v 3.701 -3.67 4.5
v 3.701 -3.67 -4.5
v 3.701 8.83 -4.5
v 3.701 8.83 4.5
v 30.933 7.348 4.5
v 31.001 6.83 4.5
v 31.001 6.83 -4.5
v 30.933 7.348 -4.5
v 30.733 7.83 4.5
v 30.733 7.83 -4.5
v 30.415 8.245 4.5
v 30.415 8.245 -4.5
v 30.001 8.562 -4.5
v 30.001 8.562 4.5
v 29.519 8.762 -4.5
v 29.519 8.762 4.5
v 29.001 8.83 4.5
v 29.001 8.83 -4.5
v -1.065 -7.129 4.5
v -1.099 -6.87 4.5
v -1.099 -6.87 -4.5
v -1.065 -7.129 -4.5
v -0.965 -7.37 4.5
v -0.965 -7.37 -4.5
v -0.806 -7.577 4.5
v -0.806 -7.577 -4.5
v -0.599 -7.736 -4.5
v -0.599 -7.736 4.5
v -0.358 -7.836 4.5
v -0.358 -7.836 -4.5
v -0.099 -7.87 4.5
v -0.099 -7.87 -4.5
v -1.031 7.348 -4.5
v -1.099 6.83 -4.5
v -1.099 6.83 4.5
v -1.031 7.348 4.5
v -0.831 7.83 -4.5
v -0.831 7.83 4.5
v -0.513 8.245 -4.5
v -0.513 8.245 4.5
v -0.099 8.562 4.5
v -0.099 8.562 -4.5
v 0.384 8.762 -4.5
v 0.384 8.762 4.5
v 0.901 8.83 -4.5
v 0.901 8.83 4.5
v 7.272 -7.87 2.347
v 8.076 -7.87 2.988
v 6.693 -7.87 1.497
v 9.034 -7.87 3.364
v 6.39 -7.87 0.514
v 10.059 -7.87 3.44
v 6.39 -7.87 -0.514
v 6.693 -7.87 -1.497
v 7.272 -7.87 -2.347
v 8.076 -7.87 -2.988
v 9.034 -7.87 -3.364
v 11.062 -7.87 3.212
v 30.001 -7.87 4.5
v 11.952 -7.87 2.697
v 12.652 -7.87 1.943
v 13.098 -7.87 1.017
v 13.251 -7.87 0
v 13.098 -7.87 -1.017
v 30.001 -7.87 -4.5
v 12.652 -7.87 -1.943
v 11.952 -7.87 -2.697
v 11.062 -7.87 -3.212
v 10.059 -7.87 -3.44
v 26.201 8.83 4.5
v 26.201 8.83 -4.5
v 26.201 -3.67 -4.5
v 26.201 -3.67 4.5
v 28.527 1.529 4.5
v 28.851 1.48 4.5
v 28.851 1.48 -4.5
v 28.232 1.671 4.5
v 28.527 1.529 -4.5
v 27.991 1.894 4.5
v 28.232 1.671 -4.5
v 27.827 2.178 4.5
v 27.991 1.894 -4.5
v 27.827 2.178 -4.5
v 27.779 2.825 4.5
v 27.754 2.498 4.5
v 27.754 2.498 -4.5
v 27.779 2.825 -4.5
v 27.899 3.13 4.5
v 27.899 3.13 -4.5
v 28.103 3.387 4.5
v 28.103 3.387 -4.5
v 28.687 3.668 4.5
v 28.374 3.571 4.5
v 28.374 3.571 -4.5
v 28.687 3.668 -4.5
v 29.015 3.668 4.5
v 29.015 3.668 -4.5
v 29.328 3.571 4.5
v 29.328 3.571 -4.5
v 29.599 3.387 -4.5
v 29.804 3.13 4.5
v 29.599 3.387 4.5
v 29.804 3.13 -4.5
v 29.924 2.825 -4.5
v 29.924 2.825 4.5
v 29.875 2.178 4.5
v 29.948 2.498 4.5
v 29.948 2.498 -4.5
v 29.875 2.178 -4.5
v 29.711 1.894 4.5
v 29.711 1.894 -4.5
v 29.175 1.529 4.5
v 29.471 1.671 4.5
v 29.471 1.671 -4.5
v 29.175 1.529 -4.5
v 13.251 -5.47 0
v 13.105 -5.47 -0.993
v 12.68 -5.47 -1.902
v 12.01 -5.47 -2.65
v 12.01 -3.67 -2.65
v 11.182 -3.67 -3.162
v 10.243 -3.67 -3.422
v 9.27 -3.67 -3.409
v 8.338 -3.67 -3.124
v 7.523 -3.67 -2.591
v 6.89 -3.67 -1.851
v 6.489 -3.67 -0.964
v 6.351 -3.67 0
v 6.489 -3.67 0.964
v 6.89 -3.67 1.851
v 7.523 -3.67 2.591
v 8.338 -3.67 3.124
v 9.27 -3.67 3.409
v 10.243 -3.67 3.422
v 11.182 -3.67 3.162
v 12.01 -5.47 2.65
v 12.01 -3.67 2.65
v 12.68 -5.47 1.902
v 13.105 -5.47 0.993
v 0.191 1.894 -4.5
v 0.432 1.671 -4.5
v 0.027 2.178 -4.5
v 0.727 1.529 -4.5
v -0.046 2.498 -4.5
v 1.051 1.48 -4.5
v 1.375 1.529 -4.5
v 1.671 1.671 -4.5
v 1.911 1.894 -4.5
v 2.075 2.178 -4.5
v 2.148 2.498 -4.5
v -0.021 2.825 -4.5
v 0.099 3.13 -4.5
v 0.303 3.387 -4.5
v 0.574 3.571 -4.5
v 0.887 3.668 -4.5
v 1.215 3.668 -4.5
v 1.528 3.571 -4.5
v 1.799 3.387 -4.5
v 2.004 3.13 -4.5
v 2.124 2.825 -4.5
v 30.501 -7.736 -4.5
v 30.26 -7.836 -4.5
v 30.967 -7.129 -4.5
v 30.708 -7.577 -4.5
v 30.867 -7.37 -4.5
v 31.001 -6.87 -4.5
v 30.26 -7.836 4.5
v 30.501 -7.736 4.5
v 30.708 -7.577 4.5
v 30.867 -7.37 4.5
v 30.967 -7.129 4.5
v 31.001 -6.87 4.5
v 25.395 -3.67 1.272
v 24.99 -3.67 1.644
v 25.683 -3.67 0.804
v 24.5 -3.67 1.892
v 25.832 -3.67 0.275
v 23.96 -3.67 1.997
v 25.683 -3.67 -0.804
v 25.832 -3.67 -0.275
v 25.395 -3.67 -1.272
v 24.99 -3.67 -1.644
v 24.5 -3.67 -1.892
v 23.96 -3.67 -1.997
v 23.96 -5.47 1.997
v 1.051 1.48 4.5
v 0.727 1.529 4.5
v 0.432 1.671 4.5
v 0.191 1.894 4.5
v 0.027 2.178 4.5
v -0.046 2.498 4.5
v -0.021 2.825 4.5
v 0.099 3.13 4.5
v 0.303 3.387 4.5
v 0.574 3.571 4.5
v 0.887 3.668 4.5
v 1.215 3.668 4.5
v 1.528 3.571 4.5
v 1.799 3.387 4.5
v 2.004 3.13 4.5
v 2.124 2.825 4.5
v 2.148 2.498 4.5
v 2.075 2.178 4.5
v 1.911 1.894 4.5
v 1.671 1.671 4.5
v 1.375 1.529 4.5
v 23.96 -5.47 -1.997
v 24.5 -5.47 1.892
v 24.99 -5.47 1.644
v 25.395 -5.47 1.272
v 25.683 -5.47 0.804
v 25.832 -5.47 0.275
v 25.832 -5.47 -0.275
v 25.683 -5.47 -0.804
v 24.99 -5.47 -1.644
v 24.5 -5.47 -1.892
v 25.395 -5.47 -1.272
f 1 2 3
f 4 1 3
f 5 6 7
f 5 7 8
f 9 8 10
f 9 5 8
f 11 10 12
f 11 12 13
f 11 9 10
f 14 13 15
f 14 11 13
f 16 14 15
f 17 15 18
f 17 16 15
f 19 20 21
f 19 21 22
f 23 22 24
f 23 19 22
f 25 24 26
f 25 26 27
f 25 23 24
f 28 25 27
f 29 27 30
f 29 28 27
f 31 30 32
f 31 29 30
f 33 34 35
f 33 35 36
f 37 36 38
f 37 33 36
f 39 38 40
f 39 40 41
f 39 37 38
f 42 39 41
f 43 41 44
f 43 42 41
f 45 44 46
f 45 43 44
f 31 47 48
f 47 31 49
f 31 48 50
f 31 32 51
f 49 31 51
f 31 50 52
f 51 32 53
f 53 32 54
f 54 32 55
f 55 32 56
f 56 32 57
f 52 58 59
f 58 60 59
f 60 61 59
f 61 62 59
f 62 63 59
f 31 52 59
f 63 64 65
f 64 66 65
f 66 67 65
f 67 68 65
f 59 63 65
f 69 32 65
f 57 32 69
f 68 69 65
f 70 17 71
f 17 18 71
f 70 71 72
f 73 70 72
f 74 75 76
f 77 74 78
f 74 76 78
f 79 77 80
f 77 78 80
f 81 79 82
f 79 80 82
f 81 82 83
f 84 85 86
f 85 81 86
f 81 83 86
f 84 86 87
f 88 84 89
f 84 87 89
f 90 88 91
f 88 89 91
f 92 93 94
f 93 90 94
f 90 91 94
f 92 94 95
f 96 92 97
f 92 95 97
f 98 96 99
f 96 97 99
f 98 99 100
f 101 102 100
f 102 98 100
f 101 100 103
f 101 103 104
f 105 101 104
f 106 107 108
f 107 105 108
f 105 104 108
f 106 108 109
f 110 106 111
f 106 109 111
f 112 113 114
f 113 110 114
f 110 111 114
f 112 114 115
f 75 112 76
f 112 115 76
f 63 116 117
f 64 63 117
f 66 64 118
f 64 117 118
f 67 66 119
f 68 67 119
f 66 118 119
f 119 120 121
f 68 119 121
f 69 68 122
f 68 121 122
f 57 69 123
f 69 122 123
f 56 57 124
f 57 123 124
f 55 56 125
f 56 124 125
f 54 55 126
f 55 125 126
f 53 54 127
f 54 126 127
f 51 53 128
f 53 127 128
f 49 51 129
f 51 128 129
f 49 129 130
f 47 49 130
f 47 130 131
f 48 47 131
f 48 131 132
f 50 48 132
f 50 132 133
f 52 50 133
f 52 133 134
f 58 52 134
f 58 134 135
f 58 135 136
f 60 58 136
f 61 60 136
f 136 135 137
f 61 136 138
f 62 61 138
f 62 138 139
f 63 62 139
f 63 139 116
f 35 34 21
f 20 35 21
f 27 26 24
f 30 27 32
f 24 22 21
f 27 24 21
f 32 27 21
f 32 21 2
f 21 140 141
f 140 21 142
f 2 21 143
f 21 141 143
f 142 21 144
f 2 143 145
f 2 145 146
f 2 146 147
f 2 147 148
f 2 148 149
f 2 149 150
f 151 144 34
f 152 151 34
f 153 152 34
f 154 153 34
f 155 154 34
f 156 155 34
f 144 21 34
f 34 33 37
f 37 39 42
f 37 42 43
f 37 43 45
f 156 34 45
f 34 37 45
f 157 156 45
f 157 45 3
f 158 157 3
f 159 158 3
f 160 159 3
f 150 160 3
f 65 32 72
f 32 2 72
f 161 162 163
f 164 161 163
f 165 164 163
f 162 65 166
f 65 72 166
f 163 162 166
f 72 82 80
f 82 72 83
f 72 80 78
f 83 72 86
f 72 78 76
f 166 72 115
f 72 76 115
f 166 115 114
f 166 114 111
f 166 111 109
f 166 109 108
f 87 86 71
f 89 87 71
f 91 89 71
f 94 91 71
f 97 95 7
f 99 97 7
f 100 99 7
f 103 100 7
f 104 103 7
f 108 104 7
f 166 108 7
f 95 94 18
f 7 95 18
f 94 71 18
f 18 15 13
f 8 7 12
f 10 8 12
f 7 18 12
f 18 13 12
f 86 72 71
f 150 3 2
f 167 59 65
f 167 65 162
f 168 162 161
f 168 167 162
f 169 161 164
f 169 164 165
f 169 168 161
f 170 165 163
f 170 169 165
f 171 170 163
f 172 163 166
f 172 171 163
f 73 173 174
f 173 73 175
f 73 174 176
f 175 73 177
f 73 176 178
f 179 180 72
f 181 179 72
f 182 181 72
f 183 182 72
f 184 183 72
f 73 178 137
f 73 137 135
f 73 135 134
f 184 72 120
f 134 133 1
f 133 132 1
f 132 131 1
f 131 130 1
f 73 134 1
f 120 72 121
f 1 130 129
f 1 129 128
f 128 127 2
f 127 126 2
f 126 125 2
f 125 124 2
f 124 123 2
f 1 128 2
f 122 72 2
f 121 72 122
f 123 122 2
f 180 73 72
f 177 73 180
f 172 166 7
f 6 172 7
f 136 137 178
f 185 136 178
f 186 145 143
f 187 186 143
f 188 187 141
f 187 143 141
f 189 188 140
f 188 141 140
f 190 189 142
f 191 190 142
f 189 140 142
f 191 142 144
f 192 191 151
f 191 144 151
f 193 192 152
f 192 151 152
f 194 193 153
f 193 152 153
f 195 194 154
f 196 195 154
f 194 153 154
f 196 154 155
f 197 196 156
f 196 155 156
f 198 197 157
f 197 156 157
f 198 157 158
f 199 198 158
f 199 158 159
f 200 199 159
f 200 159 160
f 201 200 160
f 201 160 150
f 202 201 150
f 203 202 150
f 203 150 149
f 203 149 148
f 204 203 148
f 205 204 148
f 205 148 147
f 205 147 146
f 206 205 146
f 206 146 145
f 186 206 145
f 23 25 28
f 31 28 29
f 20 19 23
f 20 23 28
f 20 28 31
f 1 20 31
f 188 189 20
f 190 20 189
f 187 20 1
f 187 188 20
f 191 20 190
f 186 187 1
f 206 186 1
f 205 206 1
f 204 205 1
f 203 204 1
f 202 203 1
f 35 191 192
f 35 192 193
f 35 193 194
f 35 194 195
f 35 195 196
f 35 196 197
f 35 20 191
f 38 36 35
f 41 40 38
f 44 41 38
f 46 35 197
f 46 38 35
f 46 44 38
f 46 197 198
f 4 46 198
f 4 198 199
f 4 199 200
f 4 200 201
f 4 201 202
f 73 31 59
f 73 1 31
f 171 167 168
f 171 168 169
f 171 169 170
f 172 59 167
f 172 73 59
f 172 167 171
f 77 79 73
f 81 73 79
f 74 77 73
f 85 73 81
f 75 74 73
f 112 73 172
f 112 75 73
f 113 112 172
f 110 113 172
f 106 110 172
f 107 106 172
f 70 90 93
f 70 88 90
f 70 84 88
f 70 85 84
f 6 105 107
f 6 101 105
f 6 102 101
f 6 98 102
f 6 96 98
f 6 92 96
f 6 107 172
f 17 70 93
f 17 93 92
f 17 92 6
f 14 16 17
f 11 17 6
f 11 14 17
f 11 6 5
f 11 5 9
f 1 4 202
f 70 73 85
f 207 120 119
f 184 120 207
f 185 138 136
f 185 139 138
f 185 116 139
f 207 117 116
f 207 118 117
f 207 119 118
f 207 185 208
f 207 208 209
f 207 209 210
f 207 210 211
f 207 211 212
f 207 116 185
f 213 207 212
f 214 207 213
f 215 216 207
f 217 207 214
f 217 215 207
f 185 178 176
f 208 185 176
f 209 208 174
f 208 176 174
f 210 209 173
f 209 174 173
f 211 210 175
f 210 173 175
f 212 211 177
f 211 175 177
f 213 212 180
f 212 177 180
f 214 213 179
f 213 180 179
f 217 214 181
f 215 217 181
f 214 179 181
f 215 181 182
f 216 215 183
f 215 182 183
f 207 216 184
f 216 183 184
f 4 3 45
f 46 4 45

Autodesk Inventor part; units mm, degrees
ref_plane "YZ Plane" through (0, 0, 0) normal (1, 0, 0) x (0, 1, 0)
ref_plane "XZ Plane" through (0, 0, 0) normal (0, 1, 0) x (-1, 0, 0)
sketch "Sketch1" plane through (0, 0, 0) normal (0, 0, 1) x (1, 0, 0)
  line L0 (-1.0988, -7.8697) -> (31.0012, -7.8697)
  line L1 (31.0012, -7.8697) -> (31.0012, 8.8303)
  line L2 (31.0012, 8.8303) -> (26.2012, 8.8303)
  line L3 (26.2012, 8.8303) -> (26.2012, -3.6697)
  line L4 (26.2012, -3.6697) -> (3.7012, -3.6697)
  line L5 (3.7012, -3.6697) -> (3.7012, 8.8303)
  line L6 (3.7012, 8.8303) -> (-1.0988, 8.8303)
  line L7 (-1.0988, 8.8303) -> (-1.0988, -7.8697)
  dimension "d5" = 4.8
  dimension "d6" = 22.5
  dimension "d7" = 12.5
  dimension "d8" = 4.2
extrude "Extrusion1" add sketch "Sketch1" along normal mid plane 9
sketch "Sketch2" plane through (0, 0, 4.5) normal (0, 0, 1) x (1, 0, 0)
  line L0 (3.7012, -3.6697) -> (3.7012, 8.8303) projected
  line L1 (3.7012, 8.8303) -> (-1.0988, 8.8303) projected
  point P0 (0, 0)
  point P1 (3.7012, 2.5803)
  point P2 (3.7012, 2.5803)
  point P3 (1.0512, 2.5803)
  point P4 (3.7012, 2.5803)
  point P5 (3.7012, 2.5803)
  dimension "d14" = 2.65
hole "Hole1" at (1.0512, 2.5803, 4.5) direction (0, 0, -1) diameter 2.2 end through all
ref_plane "Work Plane1" through (14.9512, -3.6697, 4.5) normal (-1, 0, 0) x (0, 0, 1)
mirror "Mirror1" about plane through (14.9512, -3.6697, 4.5) normal (-1, 0, 0) of "Hole1"
sketch "Sketch4" plane through (3.7012, -3.6697, 4.5) normal (0, 1, 0) x (1, 0, 0)
  line L0 (0, 9) -> (0, 0) projected
  line L1 (22.5, 0) -> (0, 0) projected
  line L2 (22.5, 9) -> (22.5, 0) projected
  line L3 (0, 9) -> (22.5, 9) projected
  circle A0 centre (6.1, 4.5) radius 3.45
  line L4 (8.3091, 7.15) -> (8.3091, 1.85) construction
  arc A1 (20.2591, 2.503) -> (20.2591, 6.497) centre (20.15, 4.5) ccw
  line L5 (8.3091, 7.15) -> (20.2591, 6.497)
  line L6 (8.3091, 1.85) -> (20.2591, 2.503)
  line L7 (6.1, 4.5) -> (20.15, 4.5) construction
  line L8 (0, 9) -> (0, 0) projected
  line L9 (0, 9) -> (0, 0) projected
  point P0 (-3.7012, 4.5)
  point P1 (11.25, 9)
  point P2 (0, 4.5)
  point P3 (0, 4.5)
  dimension "d23" = 5.3
  dimension "d25" = 2
  dimension "d26" = 14.05
  dimension "d27" = 6.9
  dimension "d28" = 6.1
extrude "Extrusion2" cut sketch "Sketch4" against normal through all contours A0
extrude "Extrusion3" cut sketch "Sketch4" against normal blind 1.8 contours A0 L5 A1 L6
fillet "Fillet1" radius 2 2 edges at (-1.0988, 8.8303, 0) (31.0012, 8.8303, 0)
fillet "Fillet1" radius 1 2 edges at (31.0012, -7.8697, 0) (-1.0988, -7.8697, 0)
properties part number "Hip v0.1"
